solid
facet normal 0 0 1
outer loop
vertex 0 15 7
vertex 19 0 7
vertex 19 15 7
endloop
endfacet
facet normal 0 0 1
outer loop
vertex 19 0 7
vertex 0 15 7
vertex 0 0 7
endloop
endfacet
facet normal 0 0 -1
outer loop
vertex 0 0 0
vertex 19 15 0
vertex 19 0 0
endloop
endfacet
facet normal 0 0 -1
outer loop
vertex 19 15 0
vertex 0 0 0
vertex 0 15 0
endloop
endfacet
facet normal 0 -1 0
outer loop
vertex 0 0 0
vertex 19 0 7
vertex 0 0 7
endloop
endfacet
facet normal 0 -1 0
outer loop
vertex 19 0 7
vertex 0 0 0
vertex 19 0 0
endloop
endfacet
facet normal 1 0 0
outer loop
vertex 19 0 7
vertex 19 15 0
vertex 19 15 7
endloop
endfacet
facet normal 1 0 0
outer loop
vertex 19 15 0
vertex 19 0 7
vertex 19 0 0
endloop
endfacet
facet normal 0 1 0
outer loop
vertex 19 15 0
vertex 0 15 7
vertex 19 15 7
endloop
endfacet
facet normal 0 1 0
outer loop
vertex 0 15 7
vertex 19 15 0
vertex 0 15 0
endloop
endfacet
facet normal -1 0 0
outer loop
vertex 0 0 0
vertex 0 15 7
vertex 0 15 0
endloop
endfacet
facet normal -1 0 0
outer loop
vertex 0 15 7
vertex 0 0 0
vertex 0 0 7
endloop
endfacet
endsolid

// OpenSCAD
// Generated by SolidPython 1.0.1 on 2020-07-29 00:46:56


cube(size = [19, 15, 7]);
/***********************************************
*********      SolidPython code:      **********
************************************************
 
# import packages: SolidPython
from solid import *
from solid.utils import *
from itertools import chain, combinations, permutations


class Resize:

    def __init__(self, scad_file):
        self.scad_file = scad_file
        #self.scad_file = import_scad(scad_file)
        # cone/cylinder param:
        self.r1 = 0
        self.r2 = 0
        self.h = 0
        # rectangular prism param:
        self.w = 0
        self.l = 0
        # ellipse param:
        self.r = 0

    # import OpenScad code (file name corresponds to shape)


    # classify shape + parameters
    def assign(self, param1, param2, param3):
        if self.scad_file == 'cone.scad':
            self.r1 = param1
            self.r2 = param2
            self.h = param3
        elif self.scad_file == 'cylinder.scad':
            self.r1 = param1
            self.r2 = param2
            self.h = param3
        elif self.scad_file == 'rectangularPrism.scad':
            self.h = param1
            self.l = param2
            self.w = param3
        else:
            self.r = param1
            self.h = param2

    # resize parameters
    def iterate(self):
        x = range(3, 20, 2)
        i = 1
        if self.scad_file == 'cone.scad':
            tempList = list(permutations(x, 2))
            for temp in tempList:
                param1 = temp[0]
                param2 = temp[1]
                filepath = 'produced_scad_files/' + 'cone' + str(param1) + '_' + str(param2) + '_' + '.scad'
                scad_render_to_file(cylinder(h=param1, r1=param2, r2=0), filepath)

        elif self.scad_file == 'cylinder.scad':
            tempList = list(permutations(x, 3))
            for temp in tempList:
                param1 = temp[0]
                param2 = temp[1]
                filepath = 'produced_scad_files/' + 'cylinder' + str(param1) + '_' + str(param2) + '_' + '.scad'
                scad_render_to_file(cylinder(h=param1, r1=param2, r2=param2), filepath)

        elif self.scad_file == 'rectangularPrism.scad':
            tempList = list(permutations(x, 3))
            for temp in tempList:
                param1 = temp[0]
                param2 = temp[1]
                param3 = temp[2]
                filepath = 'produced_scad_files/' + 'rectangularPrism' + str(param1) + '_' + str(param2) + '_' + str(
                    param3) + '.scad'
                scad_render_to_file(cube(size=(param1, param2, param3)), filepath)

        elif self.scad_file == 'ellipse.scad':
            tempList = list(permutations(x, 4))
            for temp in tempList:
                param1 = temp[0]
                param2 = temp[1]
                param3 = temp[2]
                param4 = temp[3]
                filepath = 'produced_scad_files/' + 'ellipse' + str(param1) + '_' + str(param2) + '_' + str(param3) + '_' + str(param4) + '.scad'
                scad_render_to_file(scale([param1, param2, param3])(sphere(r=param4)), filepath)

    def render_to_scadfile(self):
        scad_render_to_file(scad, 'example.scad') 
 
************************************************/
